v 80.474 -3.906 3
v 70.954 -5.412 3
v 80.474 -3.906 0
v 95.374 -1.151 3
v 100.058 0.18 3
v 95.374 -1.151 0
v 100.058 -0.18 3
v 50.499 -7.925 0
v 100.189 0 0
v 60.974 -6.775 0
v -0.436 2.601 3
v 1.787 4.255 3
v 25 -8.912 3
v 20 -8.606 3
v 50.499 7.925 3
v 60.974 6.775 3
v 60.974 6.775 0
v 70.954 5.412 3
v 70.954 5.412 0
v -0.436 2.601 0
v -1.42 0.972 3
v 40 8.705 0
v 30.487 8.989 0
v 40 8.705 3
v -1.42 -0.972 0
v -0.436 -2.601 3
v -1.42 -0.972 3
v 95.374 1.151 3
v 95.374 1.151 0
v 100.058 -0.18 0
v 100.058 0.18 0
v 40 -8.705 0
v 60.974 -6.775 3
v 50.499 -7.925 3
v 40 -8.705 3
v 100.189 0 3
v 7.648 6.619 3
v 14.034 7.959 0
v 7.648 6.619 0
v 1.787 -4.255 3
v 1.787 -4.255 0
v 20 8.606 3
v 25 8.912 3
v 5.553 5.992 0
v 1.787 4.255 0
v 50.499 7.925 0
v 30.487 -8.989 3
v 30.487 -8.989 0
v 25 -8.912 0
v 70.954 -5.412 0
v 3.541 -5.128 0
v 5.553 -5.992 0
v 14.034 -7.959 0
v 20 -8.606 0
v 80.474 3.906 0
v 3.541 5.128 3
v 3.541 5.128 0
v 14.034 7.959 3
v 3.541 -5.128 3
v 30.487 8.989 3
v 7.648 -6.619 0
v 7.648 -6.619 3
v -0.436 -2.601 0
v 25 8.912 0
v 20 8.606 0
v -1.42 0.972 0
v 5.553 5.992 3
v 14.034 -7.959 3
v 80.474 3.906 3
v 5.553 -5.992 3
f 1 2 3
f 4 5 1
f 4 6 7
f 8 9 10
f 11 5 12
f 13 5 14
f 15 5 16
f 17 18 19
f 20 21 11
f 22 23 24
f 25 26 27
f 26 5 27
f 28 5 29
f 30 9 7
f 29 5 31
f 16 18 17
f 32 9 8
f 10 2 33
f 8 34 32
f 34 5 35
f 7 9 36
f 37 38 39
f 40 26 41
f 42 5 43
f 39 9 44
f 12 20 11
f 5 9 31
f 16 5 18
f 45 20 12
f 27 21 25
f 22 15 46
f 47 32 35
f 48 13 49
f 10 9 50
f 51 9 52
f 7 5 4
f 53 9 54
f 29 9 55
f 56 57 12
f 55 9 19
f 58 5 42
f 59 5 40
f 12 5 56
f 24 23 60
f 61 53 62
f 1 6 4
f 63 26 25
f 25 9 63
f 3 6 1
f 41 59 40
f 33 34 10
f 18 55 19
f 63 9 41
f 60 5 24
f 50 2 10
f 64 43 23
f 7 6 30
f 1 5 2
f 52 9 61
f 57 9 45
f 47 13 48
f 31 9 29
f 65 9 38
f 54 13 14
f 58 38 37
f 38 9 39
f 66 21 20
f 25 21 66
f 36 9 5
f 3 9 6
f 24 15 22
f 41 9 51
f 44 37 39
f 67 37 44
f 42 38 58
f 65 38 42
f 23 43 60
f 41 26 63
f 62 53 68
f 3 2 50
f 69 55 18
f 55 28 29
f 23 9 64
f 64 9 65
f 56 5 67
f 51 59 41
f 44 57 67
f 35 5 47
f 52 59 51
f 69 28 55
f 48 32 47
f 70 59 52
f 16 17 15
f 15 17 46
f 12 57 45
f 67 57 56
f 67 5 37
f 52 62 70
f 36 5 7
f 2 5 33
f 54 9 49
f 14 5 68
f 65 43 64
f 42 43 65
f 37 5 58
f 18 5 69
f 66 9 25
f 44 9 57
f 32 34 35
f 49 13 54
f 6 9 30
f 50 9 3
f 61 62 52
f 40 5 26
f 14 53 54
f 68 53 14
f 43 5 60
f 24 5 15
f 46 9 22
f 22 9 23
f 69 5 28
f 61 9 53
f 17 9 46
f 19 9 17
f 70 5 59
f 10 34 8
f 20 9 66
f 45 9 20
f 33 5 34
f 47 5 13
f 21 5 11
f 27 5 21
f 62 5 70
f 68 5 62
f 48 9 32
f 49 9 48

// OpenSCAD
module naca0018(chord, height)
{
  hull() {
    translate([0.000000 * chord,0,0]) cylinder(r = 0.000000 * chord, h = height);
    translate([0.012500 * chord,0,0]) cylinder(r = 0.028409 * chord, h = height);
    translate([0.025000 * chord,0,0]) cylinder(r = 0.039221 * chord, h = height);
    translate([0.050000 * chord,0,0]) cylinder(r = 0.053320 * chord, h = height);
    translate([0.075000 * chord,0,0]) cylinder(r = 0.062999 * chord, h = height);
    translate([0.100000 * chord,0,0]) cylinder(r = 0.070242 * chord, h = height);
    translate([0.150000 * chord,0,0]) cylinder(r = 0.080177 * chord, h = height);
    translate([0.200000 * chord,0,0]) cylinder(r = 0.086063 * chord, h = height);
    translate([0.250000 * chord,0,0]) cylinder(r = 0.089119 * chord, h = height);
    translate([0.300000 * chord,0,0]) cylinder(r = 0.090026 * chord, h = height);
    translate([0.400000 * chord,0,0]) cylinder(r = 0.087045 * chord, h = height);
    translate([0.500000 * chord,0,0]) cylinder(r = 0.079410 * chord, h = height);
    translate([0.600000 * chord,0,0]) cylinder(r = 0.068451 * chord, h = height);
    translate([0.700000 * chord,0,0]) cylinder(r = 0.054959 * chord, h = height);
    translate([0.800000 * chord,0,0]) cylinder(r = 0.039347 * chord, h = height);
    translate([0.900000 * chord,0,0]) cylinder(r = 0.021716 * chord, h = height);
    translate([0.950000 * chord,0,0]) cylinder(r = 0.012098 * chord, h = height);
    translate([1.000000 * chord,0,0]) cylinder(r = 0.001890 * chord, h = height);
  }
}

naca0018(100, 3);
